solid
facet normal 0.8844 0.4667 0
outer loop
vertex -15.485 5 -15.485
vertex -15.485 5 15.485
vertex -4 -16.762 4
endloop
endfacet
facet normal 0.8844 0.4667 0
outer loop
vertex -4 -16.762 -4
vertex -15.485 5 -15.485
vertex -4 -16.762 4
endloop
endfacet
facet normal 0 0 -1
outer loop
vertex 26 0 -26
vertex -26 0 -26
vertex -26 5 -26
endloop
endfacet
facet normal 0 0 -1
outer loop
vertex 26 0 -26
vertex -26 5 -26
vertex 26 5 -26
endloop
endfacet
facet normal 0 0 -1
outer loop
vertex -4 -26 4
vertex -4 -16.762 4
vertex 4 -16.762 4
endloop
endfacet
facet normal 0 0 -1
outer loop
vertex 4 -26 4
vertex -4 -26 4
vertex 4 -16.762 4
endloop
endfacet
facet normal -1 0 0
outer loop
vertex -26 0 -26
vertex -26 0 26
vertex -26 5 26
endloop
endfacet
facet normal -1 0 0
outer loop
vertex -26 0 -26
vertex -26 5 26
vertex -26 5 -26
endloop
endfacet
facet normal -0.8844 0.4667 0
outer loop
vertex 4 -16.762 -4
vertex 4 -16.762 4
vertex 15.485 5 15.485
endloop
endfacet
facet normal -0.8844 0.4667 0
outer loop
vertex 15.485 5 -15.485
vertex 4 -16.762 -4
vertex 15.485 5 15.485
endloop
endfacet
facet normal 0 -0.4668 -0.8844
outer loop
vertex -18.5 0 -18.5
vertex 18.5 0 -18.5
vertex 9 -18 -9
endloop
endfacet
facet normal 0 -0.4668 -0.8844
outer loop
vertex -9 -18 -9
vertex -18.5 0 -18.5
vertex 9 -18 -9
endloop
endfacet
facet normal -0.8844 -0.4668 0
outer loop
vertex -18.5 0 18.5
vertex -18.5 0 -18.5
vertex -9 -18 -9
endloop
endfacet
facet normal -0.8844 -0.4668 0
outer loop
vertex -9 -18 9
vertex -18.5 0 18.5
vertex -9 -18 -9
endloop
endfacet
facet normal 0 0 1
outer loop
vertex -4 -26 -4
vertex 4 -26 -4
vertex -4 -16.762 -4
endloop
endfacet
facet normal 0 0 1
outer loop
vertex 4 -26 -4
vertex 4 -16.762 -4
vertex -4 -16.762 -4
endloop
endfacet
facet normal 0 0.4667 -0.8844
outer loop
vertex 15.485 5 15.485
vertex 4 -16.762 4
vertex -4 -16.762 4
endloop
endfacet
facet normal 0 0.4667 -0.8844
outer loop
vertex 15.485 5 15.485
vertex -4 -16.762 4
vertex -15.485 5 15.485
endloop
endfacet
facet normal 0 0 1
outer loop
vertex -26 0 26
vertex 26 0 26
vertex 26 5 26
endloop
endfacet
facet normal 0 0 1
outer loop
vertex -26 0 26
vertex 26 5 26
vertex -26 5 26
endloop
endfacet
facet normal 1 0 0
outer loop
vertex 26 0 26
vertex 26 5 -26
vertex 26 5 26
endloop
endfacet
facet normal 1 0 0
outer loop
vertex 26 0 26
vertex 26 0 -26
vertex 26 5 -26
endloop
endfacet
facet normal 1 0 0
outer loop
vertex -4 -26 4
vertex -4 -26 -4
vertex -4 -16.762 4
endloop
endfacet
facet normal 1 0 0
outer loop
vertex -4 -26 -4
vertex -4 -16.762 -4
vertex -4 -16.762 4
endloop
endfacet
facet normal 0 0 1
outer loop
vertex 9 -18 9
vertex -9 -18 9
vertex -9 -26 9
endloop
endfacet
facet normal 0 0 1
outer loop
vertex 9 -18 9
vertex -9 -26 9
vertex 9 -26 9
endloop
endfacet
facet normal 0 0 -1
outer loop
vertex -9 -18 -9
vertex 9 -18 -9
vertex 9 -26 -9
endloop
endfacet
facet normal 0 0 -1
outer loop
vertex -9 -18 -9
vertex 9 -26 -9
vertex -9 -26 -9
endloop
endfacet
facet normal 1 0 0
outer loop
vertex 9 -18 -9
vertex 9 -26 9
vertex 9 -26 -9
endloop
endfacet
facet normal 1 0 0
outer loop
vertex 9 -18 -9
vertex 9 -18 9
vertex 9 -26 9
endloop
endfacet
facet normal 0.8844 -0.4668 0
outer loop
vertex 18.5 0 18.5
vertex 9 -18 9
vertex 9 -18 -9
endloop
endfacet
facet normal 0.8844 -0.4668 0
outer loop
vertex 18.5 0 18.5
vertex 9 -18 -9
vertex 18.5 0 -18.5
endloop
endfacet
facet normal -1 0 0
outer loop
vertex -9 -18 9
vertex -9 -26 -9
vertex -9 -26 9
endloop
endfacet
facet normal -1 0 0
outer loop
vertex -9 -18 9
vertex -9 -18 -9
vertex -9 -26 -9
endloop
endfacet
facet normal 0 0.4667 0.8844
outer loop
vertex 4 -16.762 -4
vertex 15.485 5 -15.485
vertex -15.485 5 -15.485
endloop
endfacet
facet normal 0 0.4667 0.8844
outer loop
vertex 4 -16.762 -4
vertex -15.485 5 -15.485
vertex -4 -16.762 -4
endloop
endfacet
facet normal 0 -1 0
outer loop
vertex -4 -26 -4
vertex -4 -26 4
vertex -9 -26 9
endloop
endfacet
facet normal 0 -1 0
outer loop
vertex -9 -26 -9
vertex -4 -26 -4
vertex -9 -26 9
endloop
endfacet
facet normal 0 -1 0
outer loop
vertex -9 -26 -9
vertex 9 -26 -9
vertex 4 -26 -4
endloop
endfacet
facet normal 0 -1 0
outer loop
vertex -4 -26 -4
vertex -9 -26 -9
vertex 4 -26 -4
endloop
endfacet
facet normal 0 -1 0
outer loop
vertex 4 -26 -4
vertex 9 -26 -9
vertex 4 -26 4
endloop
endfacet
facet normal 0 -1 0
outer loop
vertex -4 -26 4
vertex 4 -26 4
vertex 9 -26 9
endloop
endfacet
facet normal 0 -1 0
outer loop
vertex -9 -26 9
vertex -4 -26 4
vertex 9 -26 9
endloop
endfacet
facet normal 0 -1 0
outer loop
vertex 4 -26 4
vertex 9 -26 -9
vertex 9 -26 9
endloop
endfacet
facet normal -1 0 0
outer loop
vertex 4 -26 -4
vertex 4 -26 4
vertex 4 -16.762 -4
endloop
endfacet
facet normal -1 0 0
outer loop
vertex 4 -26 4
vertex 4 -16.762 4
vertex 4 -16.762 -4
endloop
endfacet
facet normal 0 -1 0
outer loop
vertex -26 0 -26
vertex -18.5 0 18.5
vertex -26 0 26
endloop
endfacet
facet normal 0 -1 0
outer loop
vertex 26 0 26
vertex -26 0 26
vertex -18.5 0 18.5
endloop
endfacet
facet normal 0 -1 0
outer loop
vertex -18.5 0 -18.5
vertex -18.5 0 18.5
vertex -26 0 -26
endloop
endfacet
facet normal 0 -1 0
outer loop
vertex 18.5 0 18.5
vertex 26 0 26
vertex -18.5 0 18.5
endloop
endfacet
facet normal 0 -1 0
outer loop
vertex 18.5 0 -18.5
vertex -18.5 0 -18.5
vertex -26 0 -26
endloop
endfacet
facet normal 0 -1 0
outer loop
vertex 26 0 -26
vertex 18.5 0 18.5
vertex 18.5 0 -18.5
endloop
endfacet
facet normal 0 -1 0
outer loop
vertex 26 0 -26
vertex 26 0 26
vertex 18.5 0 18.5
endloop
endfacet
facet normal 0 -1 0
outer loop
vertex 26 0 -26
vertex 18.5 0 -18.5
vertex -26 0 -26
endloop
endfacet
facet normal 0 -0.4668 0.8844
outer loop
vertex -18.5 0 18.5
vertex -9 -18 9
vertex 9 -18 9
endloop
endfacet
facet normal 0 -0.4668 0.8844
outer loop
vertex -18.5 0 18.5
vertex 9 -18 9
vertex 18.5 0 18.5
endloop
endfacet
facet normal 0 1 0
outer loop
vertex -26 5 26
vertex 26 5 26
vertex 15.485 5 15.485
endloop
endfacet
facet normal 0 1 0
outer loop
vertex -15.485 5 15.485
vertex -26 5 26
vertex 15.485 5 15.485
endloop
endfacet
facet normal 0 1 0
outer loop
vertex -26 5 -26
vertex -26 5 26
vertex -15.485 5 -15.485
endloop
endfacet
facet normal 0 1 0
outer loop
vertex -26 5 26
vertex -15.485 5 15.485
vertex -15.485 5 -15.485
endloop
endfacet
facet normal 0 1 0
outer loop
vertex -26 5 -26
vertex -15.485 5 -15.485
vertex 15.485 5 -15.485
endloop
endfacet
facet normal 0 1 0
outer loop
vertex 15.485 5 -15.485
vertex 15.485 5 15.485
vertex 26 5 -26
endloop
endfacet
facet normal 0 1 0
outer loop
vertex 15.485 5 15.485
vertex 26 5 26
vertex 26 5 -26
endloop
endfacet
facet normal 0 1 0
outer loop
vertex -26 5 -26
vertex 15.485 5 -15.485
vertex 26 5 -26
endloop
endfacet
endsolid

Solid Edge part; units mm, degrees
sketch "Sketch1" plane through (0, 0, 0) normal (0, -1, 0) x (1, 0, 0)
  line L0 (18.5, -18.5) -> (18.5, 18.5)
  line L1 (18.5, 18.5) -> (-18.5, 18.5)
  line L2 (-18.5, 18.5) -> (-18.5, -18.5)
  line L3 (-18.5, -18.5) -> (18.5, -18.5)
extrude "Protrusion1" add sketch "Sketch1" along normal blind 18
sketch "Sketch2" plane through (18.5, -9, 0) normal (1, 0, 0) x (0, 0, 1)
  line L0 (-9, 9) -> (-18.5, 9)
  line L1 (-18.5, 9) -> (-18.5, -9)
  line L2 (-18.5, -9) -> (-9, 9)
  line L3 (9, 9) -> (18.5, -9)
  line L4 (18.5, -9) -> (18.5, 9)
  line L5 (18.5, 9) -> (9, 9)
extrude "ExtrudedCutout_5" cut sketch "Sketch2" against normal blind 37 and the other way blind 1
extrude "ExtrudedCutout_6" [suppressed]
sketch "Sketch3" plane through (0, -9, 26) normal (0, 0, 1) x (-1, 0, 0)
  line L0 (-9, 9) -> (-18.5, -9)
  line L1 (-18.5, -9) -> (-26, -9)
  line L2 (-26, -9) -> (-26, 9)
  line L3 (-26, 9) -> (-9, 9)
  line L4 (9, 9) -> (26, 9)
  line L5 (26, 9) -> (26, -9)
  line L6 (26, -9) -> (18.5, -9)
  line L7 (18.5, -9) -> (9, 9)
extrude "ExtrudedCutout_7" cut sketch "Sketch3" against normal blind 52 and the other way blind 1
sketch "Sketch4" plane through (0, 0, 0) normal (0, -1, 0) x (1, 0, 0)
  line L0 (26, 26) -> (-26, 26)
  line L1 (-26, 26) -> (-26, -26)
  line L2 (-26, -26) -> (26, -26)
  line L3 (26, -26) -> (26, 26)
extrude "ExtrudedProtrusion_7" add sketch "Sketch4" against normal blind 5
sketch "Sketch5" plane through (0, -18, 0) normal (0, -1, 0) x (-1, 0, 0)
  line L0 (9, -9) -> (-9, -9)
  line L1 (-9, -9) -> (-9, 9)
  line L2 (-9, 9) -> (9, 9)
  line L3 (9, 9) -> (9, -9)
extrude "ExtrudedProtrusion_8" add sketch "Sketch5" along normal blind 8
shell "Thinwall1" thickness 5 removed faces 2 at (-16.8133, 5, 17.8533) at (-5.82, -26, -6.18)
shell "Thinwall2" [suppressed]
